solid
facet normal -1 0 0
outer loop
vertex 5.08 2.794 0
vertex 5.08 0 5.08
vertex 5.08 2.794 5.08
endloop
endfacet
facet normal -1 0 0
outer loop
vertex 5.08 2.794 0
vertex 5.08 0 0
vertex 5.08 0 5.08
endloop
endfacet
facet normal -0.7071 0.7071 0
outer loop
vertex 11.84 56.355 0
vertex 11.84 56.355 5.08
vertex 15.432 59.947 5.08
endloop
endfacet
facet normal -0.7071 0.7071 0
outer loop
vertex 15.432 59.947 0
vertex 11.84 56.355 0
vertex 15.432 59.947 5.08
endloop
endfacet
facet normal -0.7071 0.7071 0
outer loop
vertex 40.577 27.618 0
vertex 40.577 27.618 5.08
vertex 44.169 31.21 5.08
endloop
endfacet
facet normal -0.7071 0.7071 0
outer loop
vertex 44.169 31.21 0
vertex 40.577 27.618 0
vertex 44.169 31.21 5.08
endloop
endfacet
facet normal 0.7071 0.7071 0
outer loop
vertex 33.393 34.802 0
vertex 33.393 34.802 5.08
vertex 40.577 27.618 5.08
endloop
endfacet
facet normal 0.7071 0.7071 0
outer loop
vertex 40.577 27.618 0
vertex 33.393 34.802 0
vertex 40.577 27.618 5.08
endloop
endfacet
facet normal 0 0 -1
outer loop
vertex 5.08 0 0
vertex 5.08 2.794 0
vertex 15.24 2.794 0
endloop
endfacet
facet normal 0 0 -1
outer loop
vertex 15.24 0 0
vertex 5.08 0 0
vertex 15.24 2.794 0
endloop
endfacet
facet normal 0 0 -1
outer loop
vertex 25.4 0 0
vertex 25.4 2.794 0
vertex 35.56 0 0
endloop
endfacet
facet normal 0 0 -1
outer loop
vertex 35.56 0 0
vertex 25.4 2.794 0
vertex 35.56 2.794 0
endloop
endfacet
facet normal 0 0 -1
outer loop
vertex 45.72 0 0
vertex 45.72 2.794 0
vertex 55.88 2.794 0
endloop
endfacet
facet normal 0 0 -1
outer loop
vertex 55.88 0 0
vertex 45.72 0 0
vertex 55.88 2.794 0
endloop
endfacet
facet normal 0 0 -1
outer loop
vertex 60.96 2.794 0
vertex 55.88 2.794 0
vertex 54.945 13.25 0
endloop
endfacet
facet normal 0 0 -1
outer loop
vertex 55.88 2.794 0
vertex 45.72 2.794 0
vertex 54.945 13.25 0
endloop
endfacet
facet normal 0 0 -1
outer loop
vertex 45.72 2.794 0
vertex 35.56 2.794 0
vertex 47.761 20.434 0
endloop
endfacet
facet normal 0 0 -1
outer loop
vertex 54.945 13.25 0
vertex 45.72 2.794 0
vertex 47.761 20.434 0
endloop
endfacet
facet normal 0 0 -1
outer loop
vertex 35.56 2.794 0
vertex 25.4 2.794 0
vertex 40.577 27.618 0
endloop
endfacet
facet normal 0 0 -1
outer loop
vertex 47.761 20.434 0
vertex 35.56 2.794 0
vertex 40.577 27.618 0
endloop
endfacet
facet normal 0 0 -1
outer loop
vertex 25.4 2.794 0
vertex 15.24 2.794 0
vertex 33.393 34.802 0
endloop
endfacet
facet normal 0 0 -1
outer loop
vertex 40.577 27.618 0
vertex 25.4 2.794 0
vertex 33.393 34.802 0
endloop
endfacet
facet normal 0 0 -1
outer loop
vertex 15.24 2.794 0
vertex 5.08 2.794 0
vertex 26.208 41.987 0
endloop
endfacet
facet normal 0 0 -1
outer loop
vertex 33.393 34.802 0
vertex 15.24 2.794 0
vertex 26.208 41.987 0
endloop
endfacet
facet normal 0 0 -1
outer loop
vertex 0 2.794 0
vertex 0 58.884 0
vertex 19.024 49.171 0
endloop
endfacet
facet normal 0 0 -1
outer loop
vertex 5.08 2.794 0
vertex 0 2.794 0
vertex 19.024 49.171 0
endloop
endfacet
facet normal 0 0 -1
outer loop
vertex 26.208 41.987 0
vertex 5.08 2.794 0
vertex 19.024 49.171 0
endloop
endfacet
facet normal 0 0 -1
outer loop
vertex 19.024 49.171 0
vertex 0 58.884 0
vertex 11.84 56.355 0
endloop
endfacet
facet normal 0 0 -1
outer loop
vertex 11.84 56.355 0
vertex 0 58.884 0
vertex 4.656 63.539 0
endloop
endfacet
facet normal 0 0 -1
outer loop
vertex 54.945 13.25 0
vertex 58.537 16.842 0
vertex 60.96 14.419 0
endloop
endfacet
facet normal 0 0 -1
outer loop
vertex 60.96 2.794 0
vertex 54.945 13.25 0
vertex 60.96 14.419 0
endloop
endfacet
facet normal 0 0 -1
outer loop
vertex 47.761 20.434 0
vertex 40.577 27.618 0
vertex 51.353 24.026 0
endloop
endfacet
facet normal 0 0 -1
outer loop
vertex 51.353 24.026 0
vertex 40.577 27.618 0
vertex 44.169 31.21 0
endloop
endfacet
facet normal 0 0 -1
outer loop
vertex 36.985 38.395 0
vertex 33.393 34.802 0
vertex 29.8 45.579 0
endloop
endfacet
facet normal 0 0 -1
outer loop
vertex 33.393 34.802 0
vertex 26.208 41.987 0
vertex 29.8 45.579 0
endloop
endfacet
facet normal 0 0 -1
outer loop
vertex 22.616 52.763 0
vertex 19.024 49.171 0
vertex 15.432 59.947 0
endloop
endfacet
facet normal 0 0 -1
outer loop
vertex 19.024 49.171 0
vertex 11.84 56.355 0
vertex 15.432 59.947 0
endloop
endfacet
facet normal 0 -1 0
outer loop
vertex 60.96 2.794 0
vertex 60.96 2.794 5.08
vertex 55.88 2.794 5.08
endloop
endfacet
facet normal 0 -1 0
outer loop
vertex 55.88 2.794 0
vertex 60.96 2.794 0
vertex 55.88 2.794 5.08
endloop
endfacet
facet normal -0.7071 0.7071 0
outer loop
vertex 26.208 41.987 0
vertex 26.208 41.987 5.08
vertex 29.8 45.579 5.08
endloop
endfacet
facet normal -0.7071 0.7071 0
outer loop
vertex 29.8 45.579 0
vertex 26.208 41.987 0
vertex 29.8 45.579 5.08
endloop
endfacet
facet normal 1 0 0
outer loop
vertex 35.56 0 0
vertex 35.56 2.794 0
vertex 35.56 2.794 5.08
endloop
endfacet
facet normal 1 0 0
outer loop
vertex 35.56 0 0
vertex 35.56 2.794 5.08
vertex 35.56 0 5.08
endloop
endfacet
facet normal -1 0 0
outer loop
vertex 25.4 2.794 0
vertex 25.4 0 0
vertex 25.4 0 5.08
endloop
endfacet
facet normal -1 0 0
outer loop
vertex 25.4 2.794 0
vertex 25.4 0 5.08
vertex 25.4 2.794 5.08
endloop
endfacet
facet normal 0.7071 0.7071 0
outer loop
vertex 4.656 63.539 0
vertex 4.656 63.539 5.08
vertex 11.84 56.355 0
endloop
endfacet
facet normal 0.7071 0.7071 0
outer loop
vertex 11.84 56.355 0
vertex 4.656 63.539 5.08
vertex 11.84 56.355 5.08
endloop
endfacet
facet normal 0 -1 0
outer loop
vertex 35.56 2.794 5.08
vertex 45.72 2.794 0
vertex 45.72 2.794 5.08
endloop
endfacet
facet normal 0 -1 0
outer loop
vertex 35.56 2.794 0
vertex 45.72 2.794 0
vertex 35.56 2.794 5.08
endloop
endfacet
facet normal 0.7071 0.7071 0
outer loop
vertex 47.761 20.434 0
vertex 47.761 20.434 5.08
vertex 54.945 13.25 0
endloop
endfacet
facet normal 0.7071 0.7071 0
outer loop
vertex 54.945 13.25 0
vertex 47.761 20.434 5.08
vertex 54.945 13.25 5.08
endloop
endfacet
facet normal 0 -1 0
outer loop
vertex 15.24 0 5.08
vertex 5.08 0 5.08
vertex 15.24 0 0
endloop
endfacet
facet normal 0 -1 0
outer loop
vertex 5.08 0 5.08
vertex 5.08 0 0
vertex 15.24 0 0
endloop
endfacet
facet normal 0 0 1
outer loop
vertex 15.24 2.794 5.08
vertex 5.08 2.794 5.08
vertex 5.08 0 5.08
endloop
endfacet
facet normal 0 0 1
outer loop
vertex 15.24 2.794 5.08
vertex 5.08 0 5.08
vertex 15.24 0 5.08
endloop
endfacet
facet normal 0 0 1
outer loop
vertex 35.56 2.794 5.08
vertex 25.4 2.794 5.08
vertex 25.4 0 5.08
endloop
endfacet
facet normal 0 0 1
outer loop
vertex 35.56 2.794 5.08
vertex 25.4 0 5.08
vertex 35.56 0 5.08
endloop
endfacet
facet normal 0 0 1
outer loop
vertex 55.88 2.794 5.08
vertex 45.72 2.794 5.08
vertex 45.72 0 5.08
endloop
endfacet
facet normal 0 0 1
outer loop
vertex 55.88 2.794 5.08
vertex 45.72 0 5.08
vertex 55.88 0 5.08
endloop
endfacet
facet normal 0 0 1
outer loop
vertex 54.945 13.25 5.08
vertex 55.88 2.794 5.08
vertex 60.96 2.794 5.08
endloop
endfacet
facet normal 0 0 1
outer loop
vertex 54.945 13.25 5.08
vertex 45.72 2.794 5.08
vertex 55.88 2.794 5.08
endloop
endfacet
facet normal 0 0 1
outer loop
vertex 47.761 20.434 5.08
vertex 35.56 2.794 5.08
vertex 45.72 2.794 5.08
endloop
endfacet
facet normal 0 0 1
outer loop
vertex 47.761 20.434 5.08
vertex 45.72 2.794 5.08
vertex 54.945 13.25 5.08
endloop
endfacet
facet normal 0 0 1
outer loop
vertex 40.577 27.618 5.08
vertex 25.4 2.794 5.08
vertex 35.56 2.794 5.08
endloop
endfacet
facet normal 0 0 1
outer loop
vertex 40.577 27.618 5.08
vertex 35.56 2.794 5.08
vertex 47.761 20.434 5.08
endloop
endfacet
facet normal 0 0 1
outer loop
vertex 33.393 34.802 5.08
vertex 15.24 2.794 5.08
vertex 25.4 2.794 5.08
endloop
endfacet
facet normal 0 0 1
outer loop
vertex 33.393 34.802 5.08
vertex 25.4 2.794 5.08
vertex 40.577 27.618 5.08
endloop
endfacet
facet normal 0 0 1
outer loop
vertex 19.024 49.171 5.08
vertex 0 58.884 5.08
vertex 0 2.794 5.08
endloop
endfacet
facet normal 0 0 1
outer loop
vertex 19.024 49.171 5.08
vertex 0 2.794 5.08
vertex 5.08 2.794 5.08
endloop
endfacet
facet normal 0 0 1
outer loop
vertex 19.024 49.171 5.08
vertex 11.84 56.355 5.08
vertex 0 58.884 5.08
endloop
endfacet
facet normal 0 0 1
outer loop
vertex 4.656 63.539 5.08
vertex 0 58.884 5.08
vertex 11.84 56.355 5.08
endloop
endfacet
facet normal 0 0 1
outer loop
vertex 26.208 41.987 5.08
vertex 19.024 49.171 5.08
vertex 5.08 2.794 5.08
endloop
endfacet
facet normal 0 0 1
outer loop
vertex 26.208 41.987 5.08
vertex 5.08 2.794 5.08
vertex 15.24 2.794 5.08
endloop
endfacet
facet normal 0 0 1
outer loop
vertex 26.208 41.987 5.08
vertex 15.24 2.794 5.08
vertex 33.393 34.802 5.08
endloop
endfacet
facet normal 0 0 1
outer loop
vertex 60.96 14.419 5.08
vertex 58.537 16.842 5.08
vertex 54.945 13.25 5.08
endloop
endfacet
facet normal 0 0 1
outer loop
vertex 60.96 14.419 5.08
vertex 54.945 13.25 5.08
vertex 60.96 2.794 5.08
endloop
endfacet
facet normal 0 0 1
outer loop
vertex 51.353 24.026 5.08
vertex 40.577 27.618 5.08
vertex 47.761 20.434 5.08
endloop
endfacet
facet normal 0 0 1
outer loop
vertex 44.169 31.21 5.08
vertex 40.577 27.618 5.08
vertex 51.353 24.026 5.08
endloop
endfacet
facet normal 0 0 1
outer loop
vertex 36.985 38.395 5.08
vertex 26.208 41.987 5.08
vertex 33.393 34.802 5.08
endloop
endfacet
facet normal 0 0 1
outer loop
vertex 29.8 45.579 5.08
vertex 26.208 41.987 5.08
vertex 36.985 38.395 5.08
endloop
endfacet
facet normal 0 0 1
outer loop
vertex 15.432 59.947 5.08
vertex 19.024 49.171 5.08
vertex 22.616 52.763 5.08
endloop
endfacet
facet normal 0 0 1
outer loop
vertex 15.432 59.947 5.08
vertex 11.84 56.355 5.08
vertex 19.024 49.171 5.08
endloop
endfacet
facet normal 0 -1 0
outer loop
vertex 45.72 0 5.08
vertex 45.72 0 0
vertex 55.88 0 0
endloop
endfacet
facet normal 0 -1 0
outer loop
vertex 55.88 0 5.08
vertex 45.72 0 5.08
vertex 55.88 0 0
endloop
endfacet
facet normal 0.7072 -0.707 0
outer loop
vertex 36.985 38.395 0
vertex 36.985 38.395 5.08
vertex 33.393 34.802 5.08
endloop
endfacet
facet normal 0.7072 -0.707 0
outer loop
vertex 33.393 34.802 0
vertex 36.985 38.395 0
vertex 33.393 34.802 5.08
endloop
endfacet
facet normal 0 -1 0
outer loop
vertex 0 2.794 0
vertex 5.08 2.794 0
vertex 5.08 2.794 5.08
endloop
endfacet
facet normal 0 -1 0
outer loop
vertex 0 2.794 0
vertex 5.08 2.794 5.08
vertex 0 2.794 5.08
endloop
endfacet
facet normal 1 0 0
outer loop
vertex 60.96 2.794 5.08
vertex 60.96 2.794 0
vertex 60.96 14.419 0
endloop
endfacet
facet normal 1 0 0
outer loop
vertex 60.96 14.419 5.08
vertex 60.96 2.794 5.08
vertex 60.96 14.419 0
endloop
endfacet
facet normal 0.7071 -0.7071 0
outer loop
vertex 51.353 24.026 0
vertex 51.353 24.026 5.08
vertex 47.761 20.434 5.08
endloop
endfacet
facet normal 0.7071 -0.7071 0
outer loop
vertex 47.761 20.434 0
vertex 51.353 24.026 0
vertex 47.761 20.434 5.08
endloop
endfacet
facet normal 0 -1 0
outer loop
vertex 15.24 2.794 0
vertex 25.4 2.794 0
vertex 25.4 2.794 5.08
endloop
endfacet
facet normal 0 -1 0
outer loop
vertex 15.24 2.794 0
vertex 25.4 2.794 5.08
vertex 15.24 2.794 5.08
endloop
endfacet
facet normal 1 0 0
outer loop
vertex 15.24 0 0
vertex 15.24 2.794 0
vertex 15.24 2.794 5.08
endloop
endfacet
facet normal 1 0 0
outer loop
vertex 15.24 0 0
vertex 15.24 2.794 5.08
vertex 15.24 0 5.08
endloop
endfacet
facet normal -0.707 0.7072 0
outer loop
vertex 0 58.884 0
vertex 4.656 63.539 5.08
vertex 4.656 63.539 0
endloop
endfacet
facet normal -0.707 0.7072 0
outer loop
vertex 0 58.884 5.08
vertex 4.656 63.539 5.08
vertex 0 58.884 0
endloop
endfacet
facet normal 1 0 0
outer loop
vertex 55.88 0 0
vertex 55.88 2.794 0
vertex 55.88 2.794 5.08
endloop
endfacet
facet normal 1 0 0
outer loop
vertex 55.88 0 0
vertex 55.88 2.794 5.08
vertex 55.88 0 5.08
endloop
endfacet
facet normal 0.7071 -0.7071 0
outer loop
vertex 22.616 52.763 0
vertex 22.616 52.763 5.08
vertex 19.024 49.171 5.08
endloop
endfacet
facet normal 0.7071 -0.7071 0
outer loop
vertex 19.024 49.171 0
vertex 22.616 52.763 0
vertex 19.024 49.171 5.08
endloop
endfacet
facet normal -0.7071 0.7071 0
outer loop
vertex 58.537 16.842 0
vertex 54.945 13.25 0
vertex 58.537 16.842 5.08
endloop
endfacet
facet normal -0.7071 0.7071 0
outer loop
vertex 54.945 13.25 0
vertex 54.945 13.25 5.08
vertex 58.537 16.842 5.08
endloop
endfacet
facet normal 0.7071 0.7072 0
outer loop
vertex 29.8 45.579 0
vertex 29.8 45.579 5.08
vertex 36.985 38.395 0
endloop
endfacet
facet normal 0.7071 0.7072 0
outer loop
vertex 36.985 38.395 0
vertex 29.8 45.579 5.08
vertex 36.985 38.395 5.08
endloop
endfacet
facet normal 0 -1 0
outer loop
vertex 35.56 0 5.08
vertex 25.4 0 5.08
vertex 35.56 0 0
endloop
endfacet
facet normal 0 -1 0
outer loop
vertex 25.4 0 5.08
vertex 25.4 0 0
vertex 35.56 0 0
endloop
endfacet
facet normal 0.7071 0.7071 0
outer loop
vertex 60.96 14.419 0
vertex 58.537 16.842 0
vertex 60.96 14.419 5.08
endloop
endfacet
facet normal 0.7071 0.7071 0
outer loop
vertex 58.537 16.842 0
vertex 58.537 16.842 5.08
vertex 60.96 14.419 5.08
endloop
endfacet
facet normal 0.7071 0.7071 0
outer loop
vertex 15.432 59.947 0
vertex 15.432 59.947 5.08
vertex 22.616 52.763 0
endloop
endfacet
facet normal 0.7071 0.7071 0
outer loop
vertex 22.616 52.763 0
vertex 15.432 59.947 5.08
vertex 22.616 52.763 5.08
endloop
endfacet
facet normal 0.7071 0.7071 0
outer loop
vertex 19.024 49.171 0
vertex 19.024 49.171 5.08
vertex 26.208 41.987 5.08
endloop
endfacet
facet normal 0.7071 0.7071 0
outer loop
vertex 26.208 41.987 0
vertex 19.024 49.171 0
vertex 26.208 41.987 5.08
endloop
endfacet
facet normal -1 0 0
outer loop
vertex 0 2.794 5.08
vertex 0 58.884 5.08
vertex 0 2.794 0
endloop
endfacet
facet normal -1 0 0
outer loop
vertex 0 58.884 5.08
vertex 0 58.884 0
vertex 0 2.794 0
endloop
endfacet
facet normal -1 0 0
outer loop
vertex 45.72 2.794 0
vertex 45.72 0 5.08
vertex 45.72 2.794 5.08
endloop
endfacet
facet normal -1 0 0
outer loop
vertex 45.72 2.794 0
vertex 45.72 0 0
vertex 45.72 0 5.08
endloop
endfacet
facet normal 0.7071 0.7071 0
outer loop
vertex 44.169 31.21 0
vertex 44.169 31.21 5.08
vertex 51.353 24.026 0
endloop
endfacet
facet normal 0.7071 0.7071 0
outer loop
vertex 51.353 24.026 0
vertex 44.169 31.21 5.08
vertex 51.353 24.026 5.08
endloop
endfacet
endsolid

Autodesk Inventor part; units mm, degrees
ref_plane "YZ Plane" through (0, 0, 0) normal (1, 0, 0) x (0, 1, 0)
ref_plane "XZ Plane" through (0, 0, 0) normal (0, 1, 0) x (-1, 0, 0)
ref_plane "XY Plane" through (0, 0, 0) normal (0, 0, 1) x (1, 0, 0)
sketch "Sketch1" plane through (0, 0, 0) normal (0, 0, 1) x (1, 0, 0)
  line L0 (0, 0) -> (60.96, 0)
  line L1 (60.96, 0) -> (60.96, 2.794) construction
  line L2 (60.96, 101.6) -> (0, 101.6)
  line L3 (0, 101.6) -> (0, 2.794)
  line L4 (-5.08, 0) -> (5.08, 0)
  line L5 (5.08, 0) -> (5.08, 2.794)
  line L6 (5.08, 2.794) -> (-5.08, 2.794)
  line L7 (-5.08, 2.794) -> (-5.08, 0) construction
  line L8 (15.24, 0) -> (25.4, 0)
  line L9 (25.4, 0) -> (25.4, 2.794)
  line L10 (25.4, 2.794) -> (15.24, 2.794)
  line L11 (15.24, 2.794) -> (15.24, 0)
  line L12 (35.56, 0) -> (45.72, 0)
  line L13 (45.72, 0) -> (45.72, 2.794)
  line L14 (45.72, 2.794) -> (35.56, 2.794)
  line L15 (35.56, 2.794) -> (35.56, 0)
  line L16 (55.88, 0) -> (66.04, 0) construction
  line L17 (66.04, 0) -> (66.04, 2.794) construction
  line L18 (66.04, 2.794) -> (55.88, 2.794)
  line L19 (55.88, 2.794) -> (55.88, 0)
  line L20 (60.96, 2.794) -> (60.96, 101.6)
  line L21 (0, 2.794) -> (0, 0) construction
  line L22 (0, 2.794) -> (5.08, 2.794)
  line L23 (5.08, 0) -> (5.08, 2.794)
  line L24 (5.08, 0) -> (15.24, 0)
  line L25 (15.24, 0) -> (15.24, 2.794)
  line L26 (15.24, 2.794) -> (25.4, 2.794)
  line L27 (25.4, 2.794) -> (25.4, 0)
  line L28 (25.4, 0) -> (35.56, 0)
  line L29 (35.56, 0) -> (35.56, 2.794)
  line L30 (35.56, 2.794) -> (45.72, 2.794)
  line L31 (45.72, 2.794) -> (45.72, 0)
  line L32 (45.72, 0) -> (55.88, 0)
  line L33 (55.88, 0) -> (55.88, 2.794)
  line L34 (55.88, 2.794) -> (60.96, 2.794)
  dimension "d0" = 10.16
  dimension "d1" = 2.794
  dimension "d5" = 20.32
  dimension "d11" = 101.6
  dimension "d14" = 5.08
  dimension "d15" = 5.08
extrude "Extrusion2" add sketch "Sketch1" along normal blind 5.08 contours L5 L6 L3 L2 L20 L18 L19 L0 L13 L14 L15 L9 L10 L11
sketch "Sketch2" plane through (0, 0, 5.08) normal (0, 0, 1) x (1, 0, 0)
  line L0 (33.3926, 34.8025) -> (40.5768, 27.6183) projected
  line L1 (36.9847, 38.3946) -> (44.1689, 31.2104) projected
  line L2 (58.5374, 16.8419) -> (61.3536, 14.0257)
  line L3 (61.3536, 14.0257) -> (94.79, 106.8091)
  line L4 (94.79, 106.8091) -> (9.0512, 130.8761)
  line L5 (9.0512, 130.8761) -> (-6.9479, 112.9626)
  line L6 (-6.9479, 112.9626) -> (0, 75.3793)
  line L7 (0, 101.6) -> (0, 2.794) projected
  line L8 (0, 75.3793) -> (58.5374, 16.8419)
  line L9 (36.9847, 38.3946) -> (33.3926, 34.8025) projected
  line L10 (40.5768, 27.6183) -> (44.1689, 31.2104) projected
  point P0 (0, 0)
extrude "Extrusion3" cut sketch "Sketch2" against normal blind 5.08 contours L8 L6 L5 L4 L3 L2 L1
sketch "Sketch3" plane through (0, 0, 5.08) normal (0, 0, 1) x (1, 0, 0)
  line L0 (33.3926, 34.8025) -> (40.5768, 27.6183) projected
  line L1 (36.9847, 38.3946) -> (44.1689, 31.2104) projected
  line L2 (60.96, 14.4193) -> (0, 75.3793) projected
  line L3 (58.5374, 16.8419) -> (51.3531, 24.0262)
  line L4 (51.3531, 24.0262) -> (47.761, 20.434)
  line L5 (47.761, 20.434) -> (54.9452, 13.2498)
  line L6 (54.9452, 13.2498) -> (58.5374, 16.8419)
  line L7 (44.1689, 31.2104) -> (36.9847, 38.3946)
  line L8 (36.9847, 38.3946) -> (33.3926, 34.8025)
  line L9 (33.3926, 34.8025) -> (40.5768, 27.6183)
  line L10 (40.5768, 27.6183) -> (44.1689, 31.2104)
  line L11 (29.8005, 45.5788) -> (22.6163, 52.763)
  line L12 (22.6163, 52.763) -> (19.0242, 49.1709)
  line L13 (19.0242, 49.1709) -> (26.2084, 41.9867)
  line L14 (26.2084, 41.9867) -> (29.8005, 45.5788)
  line L15 (15.4321, 59.9472) -> (8.2479, 67.1314)
  line L16 (8.2479, 67.1314) -> (4.6558, 63.5393)
  line L17 (4.6558, 63.5393) -> (11.84, 56.3551)
  line L18 (11.84, 56.3551) -> (15.4321, 59.9472)
  line L19 (1.0637, 74.3156) -> (-6.1205, 81.4998)
  line L20 (-6.1205, 81.4998) -> (-9.7126, 77.9077)
  line L21 (-9.7126, 77.9077) -> (-2.5284, 70.7235)
  line L22 (-2.5284, 70.7235) -> (1.0637, 74.3156)
  line L23 (-13.3047, 88.684) -> (-20.4889, 95.8682)
  line L24 (-20.4889, 95.8682) -> (-24.081, 92.2761)
  line L25 (-24.081, 92.2761) -> (-16.8968, 85.0919)
  line L26 (-16.8968, 85.0919) -> (-13.3047, 88.684)
  line L27 (36.9847, 38.3946) -> (33.3926, 34.8025) projected
  line L28 (40.5768, 27.6183) -> (44.1689, 31.2104) projected
  point P0 (0, 0)
  point P1 (46.5916, 28.7877)
  point P2 (26.2084, 41.9867)
  point P3 (32.2232, 43.1561)
  point P4 (11.84, 56.3551)
  point P5 (17.8548, 57.5245)
  point P6 (-2.5284, 70.7235)
  point P7 (3.4864, 71.8929)
  point P8 (-16.8968, 85.0919)
  point P9 (-10.882, 86.2613)
  dimension "d24" = 20.32
  dimension "d20" = 5.08
extrude "Extrusion4" cut sketch "Sketch3" against normal blind 5.08 contours L8 L1 L10 L0 | L22 L21 L20 L19 L2 | L18 L17 L16 L2 | L14 L13 L12 L2 | L2 L6 L5 L4
sketch "Sketch4" plane through (0, 0, 5.08) normal (0, 0, 1) x (1, 0, 0)
  line L0 (4.6558, 63.5393) -> (8.2479, 67.1314) projected
  line L1 (8.2479, 67.1314) -> (1.0637, 74.3156) projected
  line L2 (1.0637, 74.3156) -> (0, 73.2519) projected
  line L3 (0, 73.2519) -> (0, 2.794) construction
  line L4 (0, 2.794) -> (5.08, 2.794) projected
  line L5 (5.08, 2.794) -> (5.08, 0) projected
  line L6 (5.08, 0) -> (15.24, 0) projected
  line L7 (15.24, 0) -> (15.24, 2.794) projected
  line L8 (15.24, 2.794) -> (25.4, 2.794) projected
  line L9 (25.4, 2.794) -> (25.4, 0) projected
  line L10 (25.4, 0) -> (35.56, 0) projected
  line L11 (35.56, 0) -> (35.56, 2.794) projected
  line L12 (35.56, 2.794) -> (45.72, 2.794) projected
  line L13 (45.72, 2.794) -> (45.72, 0) projected
  line L14 (45.72, 0) -> (55.88, 0) projected
  line L15 (55.88, 0) -> (55.88, 2.794) projected
  line L16 (55.88, 2.794) -> (60.96, 2.794) projected
  line L17 (60.96, 2.794) -> (60.96, 14.4193) projected
  line L18 (60.96, 14.4193) -> (58.5374, 16.8419) projected
  line L19 (58.5374, 16.8419) -> (54.9452, 13.2498) projected
  line L20 (54.9452, 13.2498) -> (47.761, 20.434) projected
  line L21 (47.761, 20.434) -> (51.3531, 24.0262) projected
  line L22 (51.3531, 24.0262) -> (44.1689, 31.2104) projected
  line L23 (44.1689, 31.2104) -> (40.5768, 27.6183) projected
  line L24 (40.5768, 27.6183) -> (33.3926, 34.8025) projected
  line L25 (33.3926, 34.8025) -> (36.9847, 38.3946) projected
  line L26 (36.9847, 38.3946) -> (29.8005, 45.5788) projected
  line L27 (29.8005, 45.5788) -> (26.2084, 41.9867) projected
  line L28 (26.2084, 41.9867) -> (19.0242, 49.1709) projected
  line L29 (19.0242, 49.1709) -> (22.6163, 52.763) projected
  line L30 (22.6163, 52.763) -> (15.4321, 59.9472) projected
  line L31 (15.4321, 59.9472) -> (11.84, 56.3551) projected
  line L32 (11.84, 56.3551) -> (4.6558, 63.5393) projected
  line L33 (4.6558, 63.5393) -> (0, 58.8835)
  line L34 (0, 73.2519) -> (0, 2.794) construction
  line L35 (4.6558, 63.5393) -> (8.2479, 67.1314)
  line L36 (8.2479, 67.1314) -> (3.9736, 83.8978)
  line L37 (3.9736, 83.8978) -> (-8.4485, 80.2357)
  line L38 (-8.4485, 80.2357) -> (0, 58.8835)
  line L39 (4.6558, 63.5393) -> (8.2479, 67.1314) projected
  line L40 (8.2479, 67.1314) -> (3.9736, 83.8978)
  line L41 (0, 58.8835) -> (8.2479, 67.1314)
  line L42 (0, 58.8835) -> (-8.4485, 80.2357)
  point P0 (0, 0)
extrude "Extrusion5" cut sketch "Sketch4" against normal blind 5.08
equation "\"d5\" = 2 * d0"
equation "\"d24\" = 2 * d21"
equation "\"d21\" = 10.16"
properties part number "SledSideSupport" material "Wood (Birch)"
